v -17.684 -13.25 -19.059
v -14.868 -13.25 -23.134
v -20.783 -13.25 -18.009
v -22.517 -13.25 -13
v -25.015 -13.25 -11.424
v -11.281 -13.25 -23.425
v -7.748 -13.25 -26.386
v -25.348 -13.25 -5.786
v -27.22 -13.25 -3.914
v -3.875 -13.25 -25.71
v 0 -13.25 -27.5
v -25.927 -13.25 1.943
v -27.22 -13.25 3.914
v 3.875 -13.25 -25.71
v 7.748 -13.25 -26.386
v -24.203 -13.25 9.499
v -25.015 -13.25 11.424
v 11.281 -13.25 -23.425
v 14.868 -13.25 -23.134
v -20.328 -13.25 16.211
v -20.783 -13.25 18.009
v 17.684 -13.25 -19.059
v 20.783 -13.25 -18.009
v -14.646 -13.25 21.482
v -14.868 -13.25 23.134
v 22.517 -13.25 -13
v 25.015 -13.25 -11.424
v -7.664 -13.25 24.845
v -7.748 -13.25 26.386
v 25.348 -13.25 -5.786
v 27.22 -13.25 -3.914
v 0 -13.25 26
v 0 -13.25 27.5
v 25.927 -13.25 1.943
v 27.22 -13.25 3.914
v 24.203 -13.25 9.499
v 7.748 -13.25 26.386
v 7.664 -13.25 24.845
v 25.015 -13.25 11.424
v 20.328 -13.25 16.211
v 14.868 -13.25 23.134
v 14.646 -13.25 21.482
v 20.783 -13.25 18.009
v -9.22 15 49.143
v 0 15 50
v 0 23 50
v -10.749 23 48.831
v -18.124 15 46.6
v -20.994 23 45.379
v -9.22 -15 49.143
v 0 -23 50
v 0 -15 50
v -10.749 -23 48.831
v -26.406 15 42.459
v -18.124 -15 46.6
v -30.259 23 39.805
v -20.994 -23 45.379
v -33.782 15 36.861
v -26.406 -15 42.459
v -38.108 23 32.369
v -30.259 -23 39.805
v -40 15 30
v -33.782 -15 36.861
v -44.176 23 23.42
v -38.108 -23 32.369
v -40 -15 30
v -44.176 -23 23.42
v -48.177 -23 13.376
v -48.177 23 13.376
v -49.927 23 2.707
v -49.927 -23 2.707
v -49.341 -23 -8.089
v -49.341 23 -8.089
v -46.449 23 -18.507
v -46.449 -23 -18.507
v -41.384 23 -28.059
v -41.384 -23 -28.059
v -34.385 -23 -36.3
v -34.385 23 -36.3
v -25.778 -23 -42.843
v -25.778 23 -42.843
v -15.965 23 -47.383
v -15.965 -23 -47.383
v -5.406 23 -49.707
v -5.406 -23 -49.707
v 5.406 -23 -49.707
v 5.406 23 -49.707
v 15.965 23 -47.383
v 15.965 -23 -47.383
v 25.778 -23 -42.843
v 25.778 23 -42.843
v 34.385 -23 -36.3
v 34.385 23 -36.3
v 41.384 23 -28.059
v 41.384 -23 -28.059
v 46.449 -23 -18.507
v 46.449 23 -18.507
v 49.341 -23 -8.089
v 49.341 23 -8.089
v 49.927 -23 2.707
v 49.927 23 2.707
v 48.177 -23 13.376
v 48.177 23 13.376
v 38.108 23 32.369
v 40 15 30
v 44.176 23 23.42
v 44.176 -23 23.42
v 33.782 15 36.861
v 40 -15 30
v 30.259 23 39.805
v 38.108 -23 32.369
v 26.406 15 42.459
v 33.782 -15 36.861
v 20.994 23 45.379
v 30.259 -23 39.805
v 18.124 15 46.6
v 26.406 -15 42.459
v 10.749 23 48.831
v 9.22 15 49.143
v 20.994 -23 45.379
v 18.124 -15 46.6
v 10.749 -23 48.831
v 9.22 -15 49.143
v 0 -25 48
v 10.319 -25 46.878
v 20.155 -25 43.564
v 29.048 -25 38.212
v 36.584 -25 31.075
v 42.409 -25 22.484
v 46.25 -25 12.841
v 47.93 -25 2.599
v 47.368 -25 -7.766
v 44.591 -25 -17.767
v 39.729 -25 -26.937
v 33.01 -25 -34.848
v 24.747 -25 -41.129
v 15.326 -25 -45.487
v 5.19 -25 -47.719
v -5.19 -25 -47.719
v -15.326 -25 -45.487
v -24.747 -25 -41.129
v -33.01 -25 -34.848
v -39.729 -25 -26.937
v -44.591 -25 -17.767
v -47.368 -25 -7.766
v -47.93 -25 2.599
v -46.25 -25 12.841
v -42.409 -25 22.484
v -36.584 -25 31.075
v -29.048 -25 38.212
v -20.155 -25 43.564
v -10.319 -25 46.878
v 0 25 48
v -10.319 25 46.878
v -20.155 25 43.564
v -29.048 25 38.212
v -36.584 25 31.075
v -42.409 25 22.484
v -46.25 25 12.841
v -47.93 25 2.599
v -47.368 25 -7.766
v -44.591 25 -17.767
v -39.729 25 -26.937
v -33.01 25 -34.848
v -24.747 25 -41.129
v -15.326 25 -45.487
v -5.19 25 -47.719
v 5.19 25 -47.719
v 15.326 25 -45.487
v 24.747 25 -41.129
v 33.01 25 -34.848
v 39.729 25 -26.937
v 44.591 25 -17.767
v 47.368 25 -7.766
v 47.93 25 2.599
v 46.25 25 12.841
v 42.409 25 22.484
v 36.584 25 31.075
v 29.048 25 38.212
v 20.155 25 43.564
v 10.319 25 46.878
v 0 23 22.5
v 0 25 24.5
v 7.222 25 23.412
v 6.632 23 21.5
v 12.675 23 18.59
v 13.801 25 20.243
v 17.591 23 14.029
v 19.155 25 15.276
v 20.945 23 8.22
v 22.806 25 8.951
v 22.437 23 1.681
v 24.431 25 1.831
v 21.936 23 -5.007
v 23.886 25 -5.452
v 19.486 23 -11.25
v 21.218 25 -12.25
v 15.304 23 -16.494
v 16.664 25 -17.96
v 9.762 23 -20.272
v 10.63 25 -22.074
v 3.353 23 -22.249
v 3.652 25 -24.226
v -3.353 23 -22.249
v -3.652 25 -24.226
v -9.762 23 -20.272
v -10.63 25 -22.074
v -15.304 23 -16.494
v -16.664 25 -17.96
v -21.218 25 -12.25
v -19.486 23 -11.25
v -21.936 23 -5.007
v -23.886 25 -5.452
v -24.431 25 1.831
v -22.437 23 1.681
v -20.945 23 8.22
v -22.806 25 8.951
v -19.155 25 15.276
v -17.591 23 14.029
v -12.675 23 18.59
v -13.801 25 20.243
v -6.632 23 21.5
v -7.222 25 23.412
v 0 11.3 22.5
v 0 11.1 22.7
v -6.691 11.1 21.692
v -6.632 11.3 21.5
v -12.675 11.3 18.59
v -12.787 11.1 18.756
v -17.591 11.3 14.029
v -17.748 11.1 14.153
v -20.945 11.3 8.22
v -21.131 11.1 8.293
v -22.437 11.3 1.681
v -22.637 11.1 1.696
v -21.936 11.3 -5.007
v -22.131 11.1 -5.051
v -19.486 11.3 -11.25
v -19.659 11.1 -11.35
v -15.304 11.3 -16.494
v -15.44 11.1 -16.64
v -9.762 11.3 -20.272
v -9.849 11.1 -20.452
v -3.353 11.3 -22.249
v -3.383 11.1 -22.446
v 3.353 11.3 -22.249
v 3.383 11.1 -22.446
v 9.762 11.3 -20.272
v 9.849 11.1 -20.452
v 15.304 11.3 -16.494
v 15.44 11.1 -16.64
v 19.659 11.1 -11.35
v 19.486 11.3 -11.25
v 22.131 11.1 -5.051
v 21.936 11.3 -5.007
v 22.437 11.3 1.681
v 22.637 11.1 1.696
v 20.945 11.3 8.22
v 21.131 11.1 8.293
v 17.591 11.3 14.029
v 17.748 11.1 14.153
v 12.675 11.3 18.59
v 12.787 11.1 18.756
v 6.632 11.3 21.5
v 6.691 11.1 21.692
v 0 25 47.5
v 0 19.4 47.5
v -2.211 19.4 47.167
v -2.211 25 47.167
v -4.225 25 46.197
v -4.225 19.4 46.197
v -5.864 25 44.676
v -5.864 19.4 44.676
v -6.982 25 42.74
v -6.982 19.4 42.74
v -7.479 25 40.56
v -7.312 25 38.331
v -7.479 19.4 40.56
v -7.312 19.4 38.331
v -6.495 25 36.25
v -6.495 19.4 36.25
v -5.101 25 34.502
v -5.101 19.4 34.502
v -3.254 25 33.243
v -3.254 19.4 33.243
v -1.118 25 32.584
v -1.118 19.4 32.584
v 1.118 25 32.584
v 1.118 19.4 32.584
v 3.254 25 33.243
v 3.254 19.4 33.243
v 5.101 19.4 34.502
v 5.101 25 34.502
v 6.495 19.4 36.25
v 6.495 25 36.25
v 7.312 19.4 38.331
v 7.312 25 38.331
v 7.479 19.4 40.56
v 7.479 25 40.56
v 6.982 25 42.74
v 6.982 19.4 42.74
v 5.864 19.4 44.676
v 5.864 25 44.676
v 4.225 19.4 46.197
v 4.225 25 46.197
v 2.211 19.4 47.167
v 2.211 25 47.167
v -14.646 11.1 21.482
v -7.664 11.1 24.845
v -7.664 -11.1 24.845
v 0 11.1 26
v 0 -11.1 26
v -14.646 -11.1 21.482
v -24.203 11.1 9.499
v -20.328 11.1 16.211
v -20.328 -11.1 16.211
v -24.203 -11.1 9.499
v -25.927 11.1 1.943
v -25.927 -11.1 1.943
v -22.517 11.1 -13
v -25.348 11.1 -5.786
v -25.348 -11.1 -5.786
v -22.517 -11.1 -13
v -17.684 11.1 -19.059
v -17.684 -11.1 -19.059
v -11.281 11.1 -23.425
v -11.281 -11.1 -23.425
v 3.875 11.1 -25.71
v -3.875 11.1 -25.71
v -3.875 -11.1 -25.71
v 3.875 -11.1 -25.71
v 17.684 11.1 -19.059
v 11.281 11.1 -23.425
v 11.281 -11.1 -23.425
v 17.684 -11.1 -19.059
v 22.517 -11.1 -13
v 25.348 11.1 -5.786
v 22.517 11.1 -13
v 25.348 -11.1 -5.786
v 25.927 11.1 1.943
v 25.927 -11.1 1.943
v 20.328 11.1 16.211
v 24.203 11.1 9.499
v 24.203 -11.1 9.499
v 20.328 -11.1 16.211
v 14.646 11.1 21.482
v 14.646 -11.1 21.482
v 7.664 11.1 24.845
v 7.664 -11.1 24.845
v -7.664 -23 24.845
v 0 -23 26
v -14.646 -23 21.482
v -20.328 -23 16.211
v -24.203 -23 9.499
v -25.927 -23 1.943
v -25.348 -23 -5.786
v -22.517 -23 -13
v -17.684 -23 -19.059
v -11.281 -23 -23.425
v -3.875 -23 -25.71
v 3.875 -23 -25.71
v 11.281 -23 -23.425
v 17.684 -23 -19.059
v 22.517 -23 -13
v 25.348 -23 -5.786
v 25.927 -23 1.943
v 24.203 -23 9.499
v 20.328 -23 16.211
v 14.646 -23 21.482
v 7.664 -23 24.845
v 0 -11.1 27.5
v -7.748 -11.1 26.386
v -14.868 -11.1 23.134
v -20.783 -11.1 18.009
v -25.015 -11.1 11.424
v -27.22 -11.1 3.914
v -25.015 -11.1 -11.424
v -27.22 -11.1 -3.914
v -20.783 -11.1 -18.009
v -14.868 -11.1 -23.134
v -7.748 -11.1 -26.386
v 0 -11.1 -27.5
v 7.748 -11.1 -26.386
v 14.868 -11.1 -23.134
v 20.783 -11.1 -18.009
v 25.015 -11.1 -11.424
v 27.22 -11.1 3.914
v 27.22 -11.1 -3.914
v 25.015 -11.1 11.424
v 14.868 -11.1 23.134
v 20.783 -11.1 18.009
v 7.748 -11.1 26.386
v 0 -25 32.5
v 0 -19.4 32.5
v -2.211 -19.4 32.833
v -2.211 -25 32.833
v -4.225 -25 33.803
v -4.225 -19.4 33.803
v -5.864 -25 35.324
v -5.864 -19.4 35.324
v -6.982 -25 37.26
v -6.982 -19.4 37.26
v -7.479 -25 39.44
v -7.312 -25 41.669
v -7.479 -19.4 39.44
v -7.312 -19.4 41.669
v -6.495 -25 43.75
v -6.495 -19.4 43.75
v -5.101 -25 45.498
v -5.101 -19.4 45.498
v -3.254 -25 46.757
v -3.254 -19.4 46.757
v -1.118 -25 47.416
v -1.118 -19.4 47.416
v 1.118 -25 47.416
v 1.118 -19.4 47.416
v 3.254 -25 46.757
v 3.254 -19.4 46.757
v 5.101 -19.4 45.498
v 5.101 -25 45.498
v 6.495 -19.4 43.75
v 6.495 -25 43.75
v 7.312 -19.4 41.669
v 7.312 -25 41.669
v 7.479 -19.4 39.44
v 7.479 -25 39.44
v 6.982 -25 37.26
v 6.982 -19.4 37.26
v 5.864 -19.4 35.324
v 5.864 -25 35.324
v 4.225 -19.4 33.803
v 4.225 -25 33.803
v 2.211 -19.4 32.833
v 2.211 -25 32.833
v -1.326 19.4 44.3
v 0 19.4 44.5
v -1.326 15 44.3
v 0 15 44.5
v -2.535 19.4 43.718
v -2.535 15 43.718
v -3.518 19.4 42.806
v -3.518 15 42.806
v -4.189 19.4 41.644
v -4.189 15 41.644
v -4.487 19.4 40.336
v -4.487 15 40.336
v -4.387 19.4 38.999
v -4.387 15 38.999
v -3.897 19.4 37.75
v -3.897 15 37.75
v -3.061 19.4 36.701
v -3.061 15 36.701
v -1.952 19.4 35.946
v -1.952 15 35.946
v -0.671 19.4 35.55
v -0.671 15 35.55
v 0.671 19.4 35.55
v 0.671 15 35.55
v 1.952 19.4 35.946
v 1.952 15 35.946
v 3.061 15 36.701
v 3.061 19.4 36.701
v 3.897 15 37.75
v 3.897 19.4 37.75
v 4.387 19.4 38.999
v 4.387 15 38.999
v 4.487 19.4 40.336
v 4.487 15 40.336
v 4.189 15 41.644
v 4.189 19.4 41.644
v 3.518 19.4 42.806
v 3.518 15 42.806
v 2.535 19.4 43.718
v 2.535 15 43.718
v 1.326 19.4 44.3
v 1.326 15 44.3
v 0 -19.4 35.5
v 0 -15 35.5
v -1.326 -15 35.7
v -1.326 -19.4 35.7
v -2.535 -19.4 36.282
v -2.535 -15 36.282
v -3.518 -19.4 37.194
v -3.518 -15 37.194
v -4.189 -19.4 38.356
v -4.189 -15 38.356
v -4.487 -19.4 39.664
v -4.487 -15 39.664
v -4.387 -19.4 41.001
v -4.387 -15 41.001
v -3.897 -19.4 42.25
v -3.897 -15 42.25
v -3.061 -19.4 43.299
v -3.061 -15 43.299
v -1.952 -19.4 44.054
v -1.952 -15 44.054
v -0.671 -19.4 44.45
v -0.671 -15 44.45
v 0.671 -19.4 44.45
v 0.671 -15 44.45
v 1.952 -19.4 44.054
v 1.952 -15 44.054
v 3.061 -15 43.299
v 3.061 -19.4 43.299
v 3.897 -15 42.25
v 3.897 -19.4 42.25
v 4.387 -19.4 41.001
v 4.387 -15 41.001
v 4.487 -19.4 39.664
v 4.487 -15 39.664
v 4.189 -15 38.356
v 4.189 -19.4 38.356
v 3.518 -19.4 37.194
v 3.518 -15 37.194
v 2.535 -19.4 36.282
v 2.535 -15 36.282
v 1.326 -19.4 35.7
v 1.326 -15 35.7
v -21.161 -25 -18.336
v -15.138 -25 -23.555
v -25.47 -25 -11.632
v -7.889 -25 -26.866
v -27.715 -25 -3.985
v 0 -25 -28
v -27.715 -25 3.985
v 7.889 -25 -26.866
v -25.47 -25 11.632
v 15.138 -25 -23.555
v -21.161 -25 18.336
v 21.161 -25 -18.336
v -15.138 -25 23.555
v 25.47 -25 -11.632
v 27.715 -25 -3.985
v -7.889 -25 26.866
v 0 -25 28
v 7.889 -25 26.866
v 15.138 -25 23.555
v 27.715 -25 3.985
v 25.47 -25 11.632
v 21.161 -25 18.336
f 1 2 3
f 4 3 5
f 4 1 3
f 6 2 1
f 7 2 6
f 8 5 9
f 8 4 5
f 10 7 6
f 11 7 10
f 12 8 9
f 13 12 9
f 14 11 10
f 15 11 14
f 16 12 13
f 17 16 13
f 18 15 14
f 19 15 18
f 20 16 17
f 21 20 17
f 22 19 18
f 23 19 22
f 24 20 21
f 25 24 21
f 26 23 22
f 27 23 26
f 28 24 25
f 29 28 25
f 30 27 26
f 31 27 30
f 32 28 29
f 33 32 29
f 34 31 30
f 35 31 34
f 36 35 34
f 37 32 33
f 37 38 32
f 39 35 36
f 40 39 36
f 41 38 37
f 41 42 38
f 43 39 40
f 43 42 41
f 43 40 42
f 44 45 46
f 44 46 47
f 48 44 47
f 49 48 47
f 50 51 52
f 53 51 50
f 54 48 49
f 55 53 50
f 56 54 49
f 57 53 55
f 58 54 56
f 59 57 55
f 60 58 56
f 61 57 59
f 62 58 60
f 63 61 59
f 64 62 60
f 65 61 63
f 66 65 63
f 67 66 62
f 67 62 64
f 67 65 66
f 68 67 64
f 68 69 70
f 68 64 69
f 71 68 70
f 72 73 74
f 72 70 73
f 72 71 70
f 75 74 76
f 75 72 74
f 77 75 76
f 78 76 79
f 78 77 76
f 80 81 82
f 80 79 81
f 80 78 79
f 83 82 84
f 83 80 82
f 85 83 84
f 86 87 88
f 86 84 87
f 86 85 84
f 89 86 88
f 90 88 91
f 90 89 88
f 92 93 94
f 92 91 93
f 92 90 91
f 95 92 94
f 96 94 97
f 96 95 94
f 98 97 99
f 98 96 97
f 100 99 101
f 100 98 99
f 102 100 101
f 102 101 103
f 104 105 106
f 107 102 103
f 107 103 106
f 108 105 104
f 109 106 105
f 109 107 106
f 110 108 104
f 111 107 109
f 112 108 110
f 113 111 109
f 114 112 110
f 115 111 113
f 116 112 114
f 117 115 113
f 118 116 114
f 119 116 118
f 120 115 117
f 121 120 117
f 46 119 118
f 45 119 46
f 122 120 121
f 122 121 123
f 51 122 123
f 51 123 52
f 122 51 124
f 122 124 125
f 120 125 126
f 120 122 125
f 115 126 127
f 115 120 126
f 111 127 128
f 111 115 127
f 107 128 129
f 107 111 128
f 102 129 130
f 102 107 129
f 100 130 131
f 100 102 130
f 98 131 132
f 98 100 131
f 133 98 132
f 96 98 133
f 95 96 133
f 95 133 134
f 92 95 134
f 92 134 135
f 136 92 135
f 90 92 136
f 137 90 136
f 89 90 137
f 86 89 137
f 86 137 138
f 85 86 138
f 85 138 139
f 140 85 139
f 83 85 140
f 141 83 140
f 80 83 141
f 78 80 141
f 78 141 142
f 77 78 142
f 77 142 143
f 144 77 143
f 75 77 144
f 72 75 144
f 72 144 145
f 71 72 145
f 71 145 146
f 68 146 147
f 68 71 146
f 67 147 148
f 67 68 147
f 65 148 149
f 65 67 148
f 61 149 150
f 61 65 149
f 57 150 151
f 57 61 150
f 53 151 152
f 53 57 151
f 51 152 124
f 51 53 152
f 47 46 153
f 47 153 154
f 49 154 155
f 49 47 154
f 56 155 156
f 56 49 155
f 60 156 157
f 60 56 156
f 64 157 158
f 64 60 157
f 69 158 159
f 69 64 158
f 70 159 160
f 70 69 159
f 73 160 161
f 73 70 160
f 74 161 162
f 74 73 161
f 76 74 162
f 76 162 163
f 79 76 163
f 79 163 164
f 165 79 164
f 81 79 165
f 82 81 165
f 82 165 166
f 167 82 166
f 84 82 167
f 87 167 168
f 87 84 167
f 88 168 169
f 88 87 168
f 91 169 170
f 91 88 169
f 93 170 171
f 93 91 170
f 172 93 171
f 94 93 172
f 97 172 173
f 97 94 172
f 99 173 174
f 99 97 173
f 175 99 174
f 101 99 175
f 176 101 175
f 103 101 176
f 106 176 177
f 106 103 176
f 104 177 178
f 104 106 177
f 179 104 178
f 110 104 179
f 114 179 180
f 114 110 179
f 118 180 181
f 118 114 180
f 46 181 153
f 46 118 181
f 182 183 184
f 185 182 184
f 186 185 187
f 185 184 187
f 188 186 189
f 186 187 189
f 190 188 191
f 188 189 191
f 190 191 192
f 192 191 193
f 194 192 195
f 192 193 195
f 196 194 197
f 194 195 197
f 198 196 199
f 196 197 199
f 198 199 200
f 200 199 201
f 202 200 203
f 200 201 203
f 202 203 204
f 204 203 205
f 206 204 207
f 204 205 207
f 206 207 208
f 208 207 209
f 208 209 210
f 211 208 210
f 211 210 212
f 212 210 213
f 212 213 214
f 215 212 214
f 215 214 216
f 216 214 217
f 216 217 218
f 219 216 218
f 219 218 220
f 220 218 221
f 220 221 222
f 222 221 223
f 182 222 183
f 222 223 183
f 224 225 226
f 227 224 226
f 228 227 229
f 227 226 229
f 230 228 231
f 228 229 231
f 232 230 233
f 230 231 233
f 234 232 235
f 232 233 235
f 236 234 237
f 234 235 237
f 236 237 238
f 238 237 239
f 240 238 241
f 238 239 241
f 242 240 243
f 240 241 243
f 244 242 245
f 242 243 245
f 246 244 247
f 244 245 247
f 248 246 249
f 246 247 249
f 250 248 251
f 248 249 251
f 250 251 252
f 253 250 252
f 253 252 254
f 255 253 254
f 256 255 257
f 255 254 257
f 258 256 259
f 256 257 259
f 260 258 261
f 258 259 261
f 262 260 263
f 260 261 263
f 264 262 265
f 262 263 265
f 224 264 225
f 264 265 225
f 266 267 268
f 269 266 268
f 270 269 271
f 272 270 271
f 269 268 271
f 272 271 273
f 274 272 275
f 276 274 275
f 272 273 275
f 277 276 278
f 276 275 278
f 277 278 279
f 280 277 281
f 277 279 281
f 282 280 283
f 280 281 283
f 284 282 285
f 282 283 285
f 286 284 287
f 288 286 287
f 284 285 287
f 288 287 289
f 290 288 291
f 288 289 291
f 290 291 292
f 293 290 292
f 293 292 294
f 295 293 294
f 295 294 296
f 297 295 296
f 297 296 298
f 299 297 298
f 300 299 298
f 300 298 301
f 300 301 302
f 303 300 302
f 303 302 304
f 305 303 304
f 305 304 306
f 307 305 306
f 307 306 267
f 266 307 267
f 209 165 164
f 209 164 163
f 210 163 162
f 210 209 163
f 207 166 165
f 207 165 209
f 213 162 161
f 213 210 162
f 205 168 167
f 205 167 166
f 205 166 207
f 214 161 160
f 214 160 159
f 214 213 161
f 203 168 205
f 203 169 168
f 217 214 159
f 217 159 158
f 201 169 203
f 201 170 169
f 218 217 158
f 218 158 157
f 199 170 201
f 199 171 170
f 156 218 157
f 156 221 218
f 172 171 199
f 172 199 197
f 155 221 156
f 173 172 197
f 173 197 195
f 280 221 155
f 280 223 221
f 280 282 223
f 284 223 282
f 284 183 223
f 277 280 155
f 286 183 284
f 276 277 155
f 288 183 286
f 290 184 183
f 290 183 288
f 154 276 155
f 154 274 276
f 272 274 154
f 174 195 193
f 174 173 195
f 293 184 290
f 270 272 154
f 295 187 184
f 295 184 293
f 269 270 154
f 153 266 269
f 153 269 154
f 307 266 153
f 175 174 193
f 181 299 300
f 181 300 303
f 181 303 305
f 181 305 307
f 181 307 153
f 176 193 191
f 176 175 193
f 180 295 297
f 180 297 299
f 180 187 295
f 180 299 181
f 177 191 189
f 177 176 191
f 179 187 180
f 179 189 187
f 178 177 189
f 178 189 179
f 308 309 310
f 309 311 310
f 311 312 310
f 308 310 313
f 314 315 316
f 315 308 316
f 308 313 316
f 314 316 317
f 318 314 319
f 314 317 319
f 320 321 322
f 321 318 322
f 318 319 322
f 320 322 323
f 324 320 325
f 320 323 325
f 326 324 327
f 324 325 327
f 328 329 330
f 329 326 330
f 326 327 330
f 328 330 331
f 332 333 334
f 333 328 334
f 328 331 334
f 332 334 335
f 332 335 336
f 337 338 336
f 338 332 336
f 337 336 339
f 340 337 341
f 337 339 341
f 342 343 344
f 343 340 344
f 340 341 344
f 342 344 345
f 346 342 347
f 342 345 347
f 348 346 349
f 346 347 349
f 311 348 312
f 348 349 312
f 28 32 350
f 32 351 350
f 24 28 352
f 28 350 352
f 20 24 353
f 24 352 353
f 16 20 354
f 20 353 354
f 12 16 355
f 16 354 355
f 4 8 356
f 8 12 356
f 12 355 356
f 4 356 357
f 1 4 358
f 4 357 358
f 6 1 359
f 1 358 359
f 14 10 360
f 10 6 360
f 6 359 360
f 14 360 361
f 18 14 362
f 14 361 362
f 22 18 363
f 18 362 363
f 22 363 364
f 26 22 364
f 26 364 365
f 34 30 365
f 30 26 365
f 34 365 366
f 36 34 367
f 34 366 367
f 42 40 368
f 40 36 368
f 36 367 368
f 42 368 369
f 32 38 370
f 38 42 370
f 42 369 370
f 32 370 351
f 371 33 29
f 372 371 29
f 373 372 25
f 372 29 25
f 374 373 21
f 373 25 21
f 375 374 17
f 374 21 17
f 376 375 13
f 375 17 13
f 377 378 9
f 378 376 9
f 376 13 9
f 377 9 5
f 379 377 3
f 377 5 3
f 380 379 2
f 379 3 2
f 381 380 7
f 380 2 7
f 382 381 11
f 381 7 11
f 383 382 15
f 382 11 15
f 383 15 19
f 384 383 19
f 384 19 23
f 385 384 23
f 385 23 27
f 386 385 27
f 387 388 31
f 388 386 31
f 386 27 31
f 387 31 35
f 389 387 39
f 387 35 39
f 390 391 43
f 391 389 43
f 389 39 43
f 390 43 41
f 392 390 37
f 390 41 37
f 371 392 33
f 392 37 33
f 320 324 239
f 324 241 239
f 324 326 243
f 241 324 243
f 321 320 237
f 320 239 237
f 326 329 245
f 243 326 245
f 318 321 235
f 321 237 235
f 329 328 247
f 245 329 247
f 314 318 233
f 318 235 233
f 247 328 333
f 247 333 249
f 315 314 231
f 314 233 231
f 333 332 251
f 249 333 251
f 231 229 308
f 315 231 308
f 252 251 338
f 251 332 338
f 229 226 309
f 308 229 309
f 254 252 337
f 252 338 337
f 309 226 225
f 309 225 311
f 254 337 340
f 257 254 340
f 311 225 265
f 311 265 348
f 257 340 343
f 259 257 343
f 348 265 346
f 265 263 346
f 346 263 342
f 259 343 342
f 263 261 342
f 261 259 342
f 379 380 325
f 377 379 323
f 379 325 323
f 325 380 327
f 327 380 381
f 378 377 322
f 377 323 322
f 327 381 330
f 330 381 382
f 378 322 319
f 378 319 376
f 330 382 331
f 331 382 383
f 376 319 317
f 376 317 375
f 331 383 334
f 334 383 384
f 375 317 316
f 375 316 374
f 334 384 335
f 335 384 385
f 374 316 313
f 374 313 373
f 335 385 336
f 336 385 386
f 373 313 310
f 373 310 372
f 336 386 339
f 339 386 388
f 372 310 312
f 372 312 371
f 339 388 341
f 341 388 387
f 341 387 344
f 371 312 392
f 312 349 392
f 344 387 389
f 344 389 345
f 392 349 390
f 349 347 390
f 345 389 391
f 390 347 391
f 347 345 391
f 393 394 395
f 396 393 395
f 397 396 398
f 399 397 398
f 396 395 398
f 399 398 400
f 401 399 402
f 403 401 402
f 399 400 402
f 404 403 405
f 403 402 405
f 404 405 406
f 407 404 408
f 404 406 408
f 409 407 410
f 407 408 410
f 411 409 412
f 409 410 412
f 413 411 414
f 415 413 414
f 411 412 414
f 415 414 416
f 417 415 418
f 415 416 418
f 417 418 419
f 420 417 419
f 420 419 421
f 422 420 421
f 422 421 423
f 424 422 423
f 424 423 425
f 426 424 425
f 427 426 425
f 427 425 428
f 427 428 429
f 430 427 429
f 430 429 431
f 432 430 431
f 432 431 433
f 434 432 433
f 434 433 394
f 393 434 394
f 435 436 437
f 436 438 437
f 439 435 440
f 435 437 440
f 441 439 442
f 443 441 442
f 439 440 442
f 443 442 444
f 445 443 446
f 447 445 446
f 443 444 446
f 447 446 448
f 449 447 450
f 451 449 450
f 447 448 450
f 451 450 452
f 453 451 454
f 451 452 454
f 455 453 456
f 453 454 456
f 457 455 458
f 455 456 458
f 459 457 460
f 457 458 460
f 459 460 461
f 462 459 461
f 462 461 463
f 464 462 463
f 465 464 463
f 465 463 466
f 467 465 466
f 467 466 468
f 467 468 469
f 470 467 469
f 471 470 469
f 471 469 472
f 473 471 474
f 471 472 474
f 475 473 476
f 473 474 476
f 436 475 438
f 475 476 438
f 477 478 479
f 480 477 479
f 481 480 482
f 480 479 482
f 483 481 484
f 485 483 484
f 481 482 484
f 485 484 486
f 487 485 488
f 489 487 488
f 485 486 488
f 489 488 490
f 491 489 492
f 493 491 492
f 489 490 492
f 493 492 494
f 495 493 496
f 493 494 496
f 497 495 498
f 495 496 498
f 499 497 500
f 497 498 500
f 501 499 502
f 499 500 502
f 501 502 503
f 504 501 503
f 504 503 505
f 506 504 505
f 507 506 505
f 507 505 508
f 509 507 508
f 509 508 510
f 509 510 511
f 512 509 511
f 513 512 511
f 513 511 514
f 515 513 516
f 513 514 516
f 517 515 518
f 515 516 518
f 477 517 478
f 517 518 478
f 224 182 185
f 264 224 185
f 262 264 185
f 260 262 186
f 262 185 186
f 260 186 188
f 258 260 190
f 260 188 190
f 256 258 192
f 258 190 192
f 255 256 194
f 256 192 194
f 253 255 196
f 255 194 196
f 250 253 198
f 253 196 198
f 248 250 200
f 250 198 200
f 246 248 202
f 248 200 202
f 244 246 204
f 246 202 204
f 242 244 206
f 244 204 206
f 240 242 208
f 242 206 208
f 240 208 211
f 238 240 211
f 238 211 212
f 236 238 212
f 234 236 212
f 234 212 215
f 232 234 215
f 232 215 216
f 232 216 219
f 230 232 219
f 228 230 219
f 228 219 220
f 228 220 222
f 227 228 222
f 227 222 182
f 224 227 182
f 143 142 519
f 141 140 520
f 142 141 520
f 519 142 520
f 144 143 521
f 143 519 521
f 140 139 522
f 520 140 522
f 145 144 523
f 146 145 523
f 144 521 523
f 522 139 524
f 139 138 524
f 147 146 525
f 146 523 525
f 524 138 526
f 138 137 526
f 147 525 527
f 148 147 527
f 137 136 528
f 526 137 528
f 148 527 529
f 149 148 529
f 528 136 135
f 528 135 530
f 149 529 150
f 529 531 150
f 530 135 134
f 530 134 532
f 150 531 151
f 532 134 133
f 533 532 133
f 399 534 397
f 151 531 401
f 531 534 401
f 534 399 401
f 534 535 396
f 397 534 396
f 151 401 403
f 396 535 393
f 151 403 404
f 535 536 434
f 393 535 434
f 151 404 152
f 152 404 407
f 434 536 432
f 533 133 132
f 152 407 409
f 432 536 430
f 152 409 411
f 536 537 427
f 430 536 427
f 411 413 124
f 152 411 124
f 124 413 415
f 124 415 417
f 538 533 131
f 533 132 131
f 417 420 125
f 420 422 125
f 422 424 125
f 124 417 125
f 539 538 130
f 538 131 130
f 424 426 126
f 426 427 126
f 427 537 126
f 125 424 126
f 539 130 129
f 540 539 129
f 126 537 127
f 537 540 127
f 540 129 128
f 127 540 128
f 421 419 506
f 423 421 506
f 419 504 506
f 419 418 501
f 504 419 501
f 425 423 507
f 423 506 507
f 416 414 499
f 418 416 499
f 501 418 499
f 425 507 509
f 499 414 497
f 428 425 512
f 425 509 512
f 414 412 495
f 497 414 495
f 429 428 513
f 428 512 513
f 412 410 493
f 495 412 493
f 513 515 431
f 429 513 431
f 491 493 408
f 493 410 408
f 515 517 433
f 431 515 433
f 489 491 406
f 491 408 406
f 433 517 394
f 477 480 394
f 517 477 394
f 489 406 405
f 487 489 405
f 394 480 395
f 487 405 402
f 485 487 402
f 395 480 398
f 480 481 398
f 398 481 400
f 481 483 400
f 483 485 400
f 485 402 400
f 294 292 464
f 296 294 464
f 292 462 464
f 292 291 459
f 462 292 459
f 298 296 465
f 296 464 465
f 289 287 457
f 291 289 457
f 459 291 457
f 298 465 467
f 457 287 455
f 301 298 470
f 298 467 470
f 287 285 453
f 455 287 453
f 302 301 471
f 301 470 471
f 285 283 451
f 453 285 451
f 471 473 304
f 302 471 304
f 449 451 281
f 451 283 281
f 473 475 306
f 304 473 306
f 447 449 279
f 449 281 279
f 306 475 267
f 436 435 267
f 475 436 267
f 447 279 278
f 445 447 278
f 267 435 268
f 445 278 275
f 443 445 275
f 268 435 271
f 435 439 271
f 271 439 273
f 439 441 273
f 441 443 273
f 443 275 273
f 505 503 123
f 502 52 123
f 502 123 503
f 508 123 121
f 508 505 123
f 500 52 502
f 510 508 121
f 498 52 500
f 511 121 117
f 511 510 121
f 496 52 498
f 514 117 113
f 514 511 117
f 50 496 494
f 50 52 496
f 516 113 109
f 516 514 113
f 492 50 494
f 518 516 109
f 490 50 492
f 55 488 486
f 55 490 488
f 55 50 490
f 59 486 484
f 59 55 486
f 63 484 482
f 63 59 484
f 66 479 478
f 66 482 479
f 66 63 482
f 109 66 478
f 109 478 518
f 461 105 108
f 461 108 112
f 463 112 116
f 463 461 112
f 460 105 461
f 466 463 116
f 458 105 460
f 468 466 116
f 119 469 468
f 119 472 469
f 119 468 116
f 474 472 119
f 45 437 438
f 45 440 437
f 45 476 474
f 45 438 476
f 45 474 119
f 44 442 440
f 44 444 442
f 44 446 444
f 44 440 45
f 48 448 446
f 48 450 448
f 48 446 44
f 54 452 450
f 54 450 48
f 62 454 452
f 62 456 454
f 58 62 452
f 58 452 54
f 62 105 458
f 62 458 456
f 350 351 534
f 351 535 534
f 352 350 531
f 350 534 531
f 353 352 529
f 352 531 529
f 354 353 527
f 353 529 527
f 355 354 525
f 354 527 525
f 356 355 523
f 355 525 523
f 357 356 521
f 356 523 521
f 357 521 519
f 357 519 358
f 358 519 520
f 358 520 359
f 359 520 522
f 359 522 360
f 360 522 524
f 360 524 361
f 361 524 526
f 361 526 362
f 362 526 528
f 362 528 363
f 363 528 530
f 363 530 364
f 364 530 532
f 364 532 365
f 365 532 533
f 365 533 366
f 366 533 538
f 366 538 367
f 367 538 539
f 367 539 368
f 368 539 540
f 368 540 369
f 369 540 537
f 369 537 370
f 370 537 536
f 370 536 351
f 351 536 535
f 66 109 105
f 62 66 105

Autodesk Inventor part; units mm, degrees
ref_plane "YZ Plane" through (0, 0, 0) normal (1, 0, 0) x (0, 1, 0)
ref_plane "XZ Plane" through (0, 0, 0) normal (0, 1, 0) x (-1, 0, 0)
ref_plane "XY Plane" through (0, 0, 0) normal (0, 0, 1) x (1, 0, 0)
sketch "Skizze3" plane through (0, 0, 0) normal (1, 0, 0) x (0, 1, 0)
  line L0 (0, 60) -> (0, -10) construction
  line L1 (-35, 0) -> (35, 0) construction
  line L2 (25, 0) -> (25, 22.5) construction
  line L3 (25, 50) -> (-25, 50)
  line L4 (-25, 50) -> (-25, 26)
  line L5 (11.1, 0) -> (11.1, 26) construction
  line L6 (11.1, 26) -> (-11.1, 26) construction
  line L7 (-11.1, 26) -> (-11.1, 0) construction
  line L8 (11.1, 22.5) -> (25, 22.5)
  line L9 (11.1, 22.5) -> (11.1, 26)
  line L10 (11.1, 26) -> (-25, 26)
  line L11 (-25, 26) -> (-25, 0) construction
  line L12 (25, 22.5) -> (25, 50)
  point P0 (0, 0)
  dimension "d8" = 100
  dimension "d9" = 50
  dimension "d10" = 52
  dimension "d11" = 22.2
  dimension "d13" = 45
revolve "Grundkörper" add sketch "Skizze3" angle 360 about axis through (0, 0, 0) along (0, 1, 0)
sketch "Skizze4" plane through (0, 0, 0) normal (1, 0, 0) x (0, 1, 0)
  line L0 (-25, 50) -> (25, 50) construction
  line L1 (0, 48) -> (0, -8) construction
  line L2 (-15, 50) -> (-15, 30)
  line L3 (-15, 30) -> (15, 30)
  line L4 (15, 30) -> (15, 50)
  line L5 (-15, 50) -> (15, 50)
  point P0 (0, 0)
  dimension "d17" = 30
  dimension "d18" = 20
extrude "Profil_Ausschnitt" cut sketch "Skizze4" along normal through all both and the other way through all
sketch "Skizze5" plane through (0, -25, 0) normal (0, -1, 0) x (1, 0, 0)
  circle A0 centre (0, 0) radius 50 construction
  line L0 (0, 70) -> (0, -70) construction
  line L1 (-40, 30) -> (40, 30) construction
  line L2 (0, 30) -> (0, 50) construction
  point P0 (0, 40)
hole "ISO4762_M8_Boh" at (0, -25, 40) direction (0, 1, 0) diameter 9 end up to surface counterbore diameter 15 counterbore depth 5.6
mirror "Spiegelung_ISO4762_M8_Boh" about plane through (0, 0, 0) normal (0, 1, 0) of "ISO4762_M8_Boh"
sketch "Skizze7" plane through (0, 0, 0) normal (1, 0, 0) x (0, 1, 0)
  line L0 (-35, 0) -> (35, 0) construction
  line L1 (11.1, -26) -> (11.1, 26) construction
  line L2 (11.1, 26) -> (-25, 26) construction
  line L3 (-11.1, 26) -> (-11.1, 27.5)
  line L4 (-11.1, 27.5) -> (-13.25, 27.5)
  line L5 (-13.25, 27.5) -> (-13.25, 26)
  line L6 (-11.1, 26) -> (-13.25, 26)
  point P0 (0, 0)
  dimension "d34" = 55
  dimension "d35" = 2.15
  dimension "d36" = 22.2
revolve "DIN472-52x2-Nut" cut sketch "Skizze7" angle 360 about axis through (0, 0, 0) along (0, 1, 0)
chamfer "Fase_Allgemein" distance 2 angle 45 4 edges at (0, -25, -50) (0, 25, -50) (0, -25, -26) (0, 25, -22.5)
chamfer "Fase2" distance 0.2 angle 45 1 edges at (0, 11.1, -22.5)
properties part number "200-30-ROCKER-BOGIE-BEARING-01" material "Aluminium 6061"
